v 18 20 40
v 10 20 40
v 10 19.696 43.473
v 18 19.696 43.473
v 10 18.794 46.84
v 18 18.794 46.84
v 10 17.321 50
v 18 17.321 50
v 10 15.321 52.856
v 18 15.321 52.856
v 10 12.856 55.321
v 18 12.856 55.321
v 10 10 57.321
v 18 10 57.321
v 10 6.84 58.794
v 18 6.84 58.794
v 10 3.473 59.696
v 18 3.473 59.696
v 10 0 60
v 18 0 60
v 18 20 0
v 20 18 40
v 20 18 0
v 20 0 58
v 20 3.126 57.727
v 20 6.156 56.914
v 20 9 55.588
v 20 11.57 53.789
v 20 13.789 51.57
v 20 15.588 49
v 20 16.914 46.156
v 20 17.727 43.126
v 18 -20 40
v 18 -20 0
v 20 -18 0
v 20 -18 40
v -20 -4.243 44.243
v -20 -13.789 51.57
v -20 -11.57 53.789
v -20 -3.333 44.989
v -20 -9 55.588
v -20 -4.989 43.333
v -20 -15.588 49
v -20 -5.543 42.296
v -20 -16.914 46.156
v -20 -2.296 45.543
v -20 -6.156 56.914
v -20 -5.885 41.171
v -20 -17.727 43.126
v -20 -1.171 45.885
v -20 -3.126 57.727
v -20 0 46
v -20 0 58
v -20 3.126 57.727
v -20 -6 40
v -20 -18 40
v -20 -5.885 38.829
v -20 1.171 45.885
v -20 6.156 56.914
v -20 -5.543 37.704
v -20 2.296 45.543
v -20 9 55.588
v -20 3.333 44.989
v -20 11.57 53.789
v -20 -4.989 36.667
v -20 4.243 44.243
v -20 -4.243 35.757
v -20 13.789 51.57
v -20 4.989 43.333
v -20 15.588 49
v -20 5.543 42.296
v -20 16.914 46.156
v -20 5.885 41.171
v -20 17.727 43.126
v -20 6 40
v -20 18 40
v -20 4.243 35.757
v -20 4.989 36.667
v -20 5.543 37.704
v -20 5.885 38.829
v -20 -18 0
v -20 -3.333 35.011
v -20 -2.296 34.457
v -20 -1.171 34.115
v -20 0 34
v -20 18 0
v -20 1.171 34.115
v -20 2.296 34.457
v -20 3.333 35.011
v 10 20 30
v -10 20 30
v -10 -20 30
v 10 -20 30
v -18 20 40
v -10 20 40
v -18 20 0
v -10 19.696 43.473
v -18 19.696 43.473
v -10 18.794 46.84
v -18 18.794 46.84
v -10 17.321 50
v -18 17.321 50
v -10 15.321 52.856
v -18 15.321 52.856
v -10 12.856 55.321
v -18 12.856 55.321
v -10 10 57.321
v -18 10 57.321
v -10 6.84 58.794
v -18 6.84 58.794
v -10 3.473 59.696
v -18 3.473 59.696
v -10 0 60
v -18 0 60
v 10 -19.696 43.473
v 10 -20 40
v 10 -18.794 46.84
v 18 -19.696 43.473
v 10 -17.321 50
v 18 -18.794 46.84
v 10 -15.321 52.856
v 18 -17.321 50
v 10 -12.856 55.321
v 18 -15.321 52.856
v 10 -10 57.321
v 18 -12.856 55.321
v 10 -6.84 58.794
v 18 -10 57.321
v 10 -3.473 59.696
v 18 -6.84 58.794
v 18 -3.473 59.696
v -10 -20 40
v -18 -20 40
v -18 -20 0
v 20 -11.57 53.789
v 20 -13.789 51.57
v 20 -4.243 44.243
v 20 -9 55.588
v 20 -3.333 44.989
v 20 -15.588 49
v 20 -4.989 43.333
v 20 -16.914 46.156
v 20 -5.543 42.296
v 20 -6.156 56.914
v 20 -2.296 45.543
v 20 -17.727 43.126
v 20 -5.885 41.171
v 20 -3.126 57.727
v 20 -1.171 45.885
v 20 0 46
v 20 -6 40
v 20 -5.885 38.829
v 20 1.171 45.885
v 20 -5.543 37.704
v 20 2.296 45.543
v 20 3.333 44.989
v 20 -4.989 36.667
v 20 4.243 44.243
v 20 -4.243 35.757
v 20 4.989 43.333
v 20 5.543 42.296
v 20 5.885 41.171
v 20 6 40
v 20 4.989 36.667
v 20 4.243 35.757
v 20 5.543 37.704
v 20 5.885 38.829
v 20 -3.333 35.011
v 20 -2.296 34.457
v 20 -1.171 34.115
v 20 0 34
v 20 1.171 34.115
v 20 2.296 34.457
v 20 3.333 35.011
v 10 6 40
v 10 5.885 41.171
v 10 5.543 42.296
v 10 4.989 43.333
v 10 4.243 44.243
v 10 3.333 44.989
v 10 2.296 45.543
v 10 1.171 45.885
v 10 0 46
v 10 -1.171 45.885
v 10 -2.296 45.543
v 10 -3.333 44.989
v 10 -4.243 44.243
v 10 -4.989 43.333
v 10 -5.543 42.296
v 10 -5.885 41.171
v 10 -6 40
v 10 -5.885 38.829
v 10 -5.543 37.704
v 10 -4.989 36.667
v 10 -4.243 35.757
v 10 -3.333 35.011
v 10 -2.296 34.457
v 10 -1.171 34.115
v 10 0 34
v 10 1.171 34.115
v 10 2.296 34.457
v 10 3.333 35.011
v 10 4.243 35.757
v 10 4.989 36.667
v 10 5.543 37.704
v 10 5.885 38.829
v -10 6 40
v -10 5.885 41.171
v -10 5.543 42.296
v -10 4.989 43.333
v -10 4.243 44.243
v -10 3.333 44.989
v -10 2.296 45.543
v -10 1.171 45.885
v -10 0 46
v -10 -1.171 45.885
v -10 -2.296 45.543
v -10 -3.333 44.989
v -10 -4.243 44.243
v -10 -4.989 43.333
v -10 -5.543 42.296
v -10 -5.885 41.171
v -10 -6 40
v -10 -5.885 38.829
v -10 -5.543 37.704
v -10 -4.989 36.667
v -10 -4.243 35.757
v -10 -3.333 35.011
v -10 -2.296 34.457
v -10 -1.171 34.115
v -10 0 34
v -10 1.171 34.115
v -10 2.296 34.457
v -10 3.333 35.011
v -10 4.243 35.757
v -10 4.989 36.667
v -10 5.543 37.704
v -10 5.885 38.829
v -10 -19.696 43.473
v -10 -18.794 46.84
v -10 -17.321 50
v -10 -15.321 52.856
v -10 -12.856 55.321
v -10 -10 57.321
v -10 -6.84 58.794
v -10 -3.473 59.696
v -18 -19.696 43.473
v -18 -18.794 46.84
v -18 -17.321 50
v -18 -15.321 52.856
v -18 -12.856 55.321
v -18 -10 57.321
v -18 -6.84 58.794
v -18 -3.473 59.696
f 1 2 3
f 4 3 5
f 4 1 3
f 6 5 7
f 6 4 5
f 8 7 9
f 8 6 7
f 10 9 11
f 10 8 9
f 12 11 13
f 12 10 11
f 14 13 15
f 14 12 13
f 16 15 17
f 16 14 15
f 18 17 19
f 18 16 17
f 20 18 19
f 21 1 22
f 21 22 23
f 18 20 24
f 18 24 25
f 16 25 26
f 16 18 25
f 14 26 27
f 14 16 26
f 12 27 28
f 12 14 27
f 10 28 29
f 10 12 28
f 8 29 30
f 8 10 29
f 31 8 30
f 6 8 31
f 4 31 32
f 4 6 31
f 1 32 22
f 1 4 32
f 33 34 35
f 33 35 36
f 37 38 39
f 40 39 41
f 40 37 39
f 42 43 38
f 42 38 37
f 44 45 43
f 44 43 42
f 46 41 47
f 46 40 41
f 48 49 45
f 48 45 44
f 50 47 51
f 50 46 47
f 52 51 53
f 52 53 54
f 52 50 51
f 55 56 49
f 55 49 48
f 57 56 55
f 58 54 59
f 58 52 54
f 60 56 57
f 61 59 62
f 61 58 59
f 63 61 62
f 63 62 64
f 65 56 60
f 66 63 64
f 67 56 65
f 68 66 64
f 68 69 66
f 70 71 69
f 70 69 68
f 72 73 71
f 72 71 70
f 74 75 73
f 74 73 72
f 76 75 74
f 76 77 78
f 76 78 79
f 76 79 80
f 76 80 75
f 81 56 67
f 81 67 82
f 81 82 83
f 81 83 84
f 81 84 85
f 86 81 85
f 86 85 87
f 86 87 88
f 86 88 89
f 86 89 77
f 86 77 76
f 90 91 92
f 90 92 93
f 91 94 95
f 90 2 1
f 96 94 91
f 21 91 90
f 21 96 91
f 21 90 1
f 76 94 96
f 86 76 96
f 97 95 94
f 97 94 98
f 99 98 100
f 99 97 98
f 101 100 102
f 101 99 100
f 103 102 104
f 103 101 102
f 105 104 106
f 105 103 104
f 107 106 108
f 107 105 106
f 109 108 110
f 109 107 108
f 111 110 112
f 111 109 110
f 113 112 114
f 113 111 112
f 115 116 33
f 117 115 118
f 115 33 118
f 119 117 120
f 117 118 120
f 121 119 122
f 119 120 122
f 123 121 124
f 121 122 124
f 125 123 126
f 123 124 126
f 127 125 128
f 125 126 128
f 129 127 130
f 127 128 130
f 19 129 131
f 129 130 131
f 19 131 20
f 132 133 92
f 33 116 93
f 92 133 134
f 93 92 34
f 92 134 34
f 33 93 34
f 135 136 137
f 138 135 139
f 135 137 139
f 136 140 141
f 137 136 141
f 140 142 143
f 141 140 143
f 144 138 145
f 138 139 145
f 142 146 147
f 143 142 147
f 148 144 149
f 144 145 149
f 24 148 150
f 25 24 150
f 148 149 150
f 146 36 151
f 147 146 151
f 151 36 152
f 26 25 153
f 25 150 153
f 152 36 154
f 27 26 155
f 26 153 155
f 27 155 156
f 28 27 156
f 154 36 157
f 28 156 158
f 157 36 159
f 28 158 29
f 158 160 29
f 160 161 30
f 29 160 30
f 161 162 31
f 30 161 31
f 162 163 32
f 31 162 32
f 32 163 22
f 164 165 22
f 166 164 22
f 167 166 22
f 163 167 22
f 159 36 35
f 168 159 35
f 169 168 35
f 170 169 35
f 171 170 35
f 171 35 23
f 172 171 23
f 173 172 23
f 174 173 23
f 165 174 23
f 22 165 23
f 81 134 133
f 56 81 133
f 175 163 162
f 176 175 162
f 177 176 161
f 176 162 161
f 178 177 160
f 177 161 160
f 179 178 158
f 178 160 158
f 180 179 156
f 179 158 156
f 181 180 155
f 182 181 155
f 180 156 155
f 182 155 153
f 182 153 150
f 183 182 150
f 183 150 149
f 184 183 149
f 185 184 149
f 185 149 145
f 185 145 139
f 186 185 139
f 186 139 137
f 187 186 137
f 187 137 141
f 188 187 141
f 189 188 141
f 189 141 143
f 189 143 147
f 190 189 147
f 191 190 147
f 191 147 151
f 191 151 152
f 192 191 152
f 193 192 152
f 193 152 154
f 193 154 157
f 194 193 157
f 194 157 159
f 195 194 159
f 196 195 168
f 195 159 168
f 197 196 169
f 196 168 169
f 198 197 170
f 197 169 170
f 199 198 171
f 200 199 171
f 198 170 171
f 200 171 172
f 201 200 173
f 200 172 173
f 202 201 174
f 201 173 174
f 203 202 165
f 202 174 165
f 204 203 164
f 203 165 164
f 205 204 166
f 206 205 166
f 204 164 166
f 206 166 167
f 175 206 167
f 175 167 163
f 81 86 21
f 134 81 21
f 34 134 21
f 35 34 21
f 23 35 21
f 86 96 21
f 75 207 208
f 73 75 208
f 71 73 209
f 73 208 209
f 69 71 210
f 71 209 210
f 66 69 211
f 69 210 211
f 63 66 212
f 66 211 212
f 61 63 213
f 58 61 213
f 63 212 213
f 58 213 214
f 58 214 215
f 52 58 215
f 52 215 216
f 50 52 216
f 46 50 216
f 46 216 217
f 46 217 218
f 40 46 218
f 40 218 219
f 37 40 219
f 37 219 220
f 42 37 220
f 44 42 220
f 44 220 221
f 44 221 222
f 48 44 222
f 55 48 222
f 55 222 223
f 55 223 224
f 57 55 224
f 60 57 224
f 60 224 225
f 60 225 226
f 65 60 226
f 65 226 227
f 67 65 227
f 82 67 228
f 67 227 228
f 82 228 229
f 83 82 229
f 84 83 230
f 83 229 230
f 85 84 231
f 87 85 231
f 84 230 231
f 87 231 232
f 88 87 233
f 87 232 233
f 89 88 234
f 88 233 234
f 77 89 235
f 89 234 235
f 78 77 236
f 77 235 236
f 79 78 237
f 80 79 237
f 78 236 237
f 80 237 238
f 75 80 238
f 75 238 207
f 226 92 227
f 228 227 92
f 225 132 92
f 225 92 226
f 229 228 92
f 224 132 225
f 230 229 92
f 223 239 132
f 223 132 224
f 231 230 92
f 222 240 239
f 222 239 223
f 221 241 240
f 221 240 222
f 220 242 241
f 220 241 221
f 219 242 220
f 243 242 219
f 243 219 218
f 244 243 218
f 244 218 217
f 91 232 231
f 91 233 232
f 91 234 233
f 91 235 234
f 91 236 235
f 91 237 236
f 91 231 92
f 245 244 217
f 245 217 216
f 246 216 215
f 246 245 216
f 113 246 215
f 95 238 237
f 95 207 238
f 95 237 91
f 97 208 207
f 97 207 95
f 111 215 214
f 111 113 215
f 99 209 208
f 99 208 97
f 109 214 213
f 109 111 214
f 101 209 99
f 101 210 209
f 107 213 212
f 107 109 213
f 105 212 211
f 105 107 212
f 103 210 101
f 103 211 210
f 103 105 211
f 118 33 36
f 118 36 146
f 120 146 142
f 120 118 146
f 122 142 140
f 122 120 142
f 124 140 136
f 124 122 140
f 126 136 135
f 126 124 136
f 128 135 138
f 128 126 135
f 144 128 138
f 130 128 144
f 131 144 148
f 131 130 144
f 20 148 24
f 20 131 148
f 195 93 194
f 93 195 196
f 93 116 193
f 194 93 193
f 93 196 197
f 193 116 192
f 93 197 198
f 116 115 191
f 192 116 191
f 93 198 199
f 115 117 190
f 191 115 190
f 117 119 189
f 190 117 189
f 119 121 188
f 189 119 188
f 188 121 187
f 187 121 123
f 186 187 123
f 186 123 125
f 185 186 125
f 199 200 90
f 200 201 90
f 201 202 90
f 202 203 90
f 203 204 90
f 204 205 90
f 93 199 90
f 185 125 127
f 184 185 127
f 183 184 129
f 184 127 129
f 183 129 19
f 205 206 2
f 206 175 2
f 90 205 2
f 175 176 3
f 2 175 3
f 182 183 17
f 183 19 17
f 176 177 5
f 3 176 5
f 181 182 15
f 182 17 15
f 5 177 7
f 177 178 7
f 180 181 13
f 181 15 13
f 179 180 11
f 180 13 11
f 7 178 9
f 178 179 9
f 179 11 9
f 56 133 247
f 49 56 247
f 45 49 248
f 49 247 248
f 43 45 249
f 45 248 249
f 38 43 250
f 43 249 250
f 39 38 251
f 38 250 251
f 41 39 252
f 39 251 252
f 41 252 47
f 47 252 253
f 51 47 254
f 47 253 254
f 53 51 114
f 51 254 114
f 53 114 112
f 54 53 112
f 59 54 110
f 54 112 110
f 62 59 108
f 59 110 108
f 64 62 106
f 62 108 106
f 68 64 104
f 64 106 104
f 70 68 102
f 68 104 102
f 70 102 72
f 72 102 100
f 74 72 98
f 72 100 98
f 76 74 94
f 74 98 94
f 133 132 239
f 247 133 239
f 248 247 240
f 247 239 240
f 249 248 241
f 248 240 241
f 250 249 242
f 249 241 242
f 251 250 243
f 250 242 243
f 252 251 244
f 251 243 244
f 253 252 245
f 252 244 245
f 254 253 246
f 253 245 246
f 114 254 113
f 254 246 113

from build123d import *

# Parameters (mm, degrees)
F0_W          = 40
F0_H          = 40
F1_DEPTH      = 60
F2_W          = 20
F2_H          = 40
F3_DEPTH      = 30
F4_R          = 19.99999
F5_SIZE       = 2
F6_R          = 6
F7_DEPTH      = 56.6
F7_DEPTH_BACK = 25


# Not quite as in the source:
# - a fillet or chamfer is up to 0.001 mm smaller than in the source, because OpenCascade refuses the exact size


with BuildPart() as f1:
    # F0 (on Top) → F1 (new body)
    with BuildSketch(Plane.XY):
        Rectangle(F0_W, F0_H)
    extrude(amount=F1_DEPTH)

    # F2 (on face) → F3 (cut)
    with BuildSketch(Plane.XY.offset(60)):
        Rectangle(F2_W, F2_H)
    extrude(amount=-F3_DEPTH, mode=Mode.SUBTRACT)

    # F4 (radius 20 in the source; OpenCascade refuses exactly that, so slightly less here)
    f4_edges = [f1.edges().sort_by_distance(p)[0] for p in [
        (15, -20, 60),
        (-15, -20, 60),
        (15, 20, 60),
        (-15, 20, 60),
    ]]
    fillet(f4_edges, radius=F4_R)

    # F5
    f5_edges = [f1.edges().sort_by_distance(p)[0] for p in [
        (-20, -20, 20.000005),
        (-20, -14.142139, 54.142139),
        (20, -14.142139, 54.142139),
    ]]
    chamfer(f5_edges, length=F5_SIZE)

    # F6 (on face) → F7 (cut, two sides)
    with BuildSketch(Plane.YZ.offset(20)) as f7_sk:
        with Locations((0, 40)):
            Circle(F6_R)
    extrude(amount=-F7_DEPTH, mode=Mode.SUBTRACT)
    extrude(f7_sk.sketch, amount=F7_DEPTH_BACK, mode=Mode.SUBTRACT)


solid = f1.part
